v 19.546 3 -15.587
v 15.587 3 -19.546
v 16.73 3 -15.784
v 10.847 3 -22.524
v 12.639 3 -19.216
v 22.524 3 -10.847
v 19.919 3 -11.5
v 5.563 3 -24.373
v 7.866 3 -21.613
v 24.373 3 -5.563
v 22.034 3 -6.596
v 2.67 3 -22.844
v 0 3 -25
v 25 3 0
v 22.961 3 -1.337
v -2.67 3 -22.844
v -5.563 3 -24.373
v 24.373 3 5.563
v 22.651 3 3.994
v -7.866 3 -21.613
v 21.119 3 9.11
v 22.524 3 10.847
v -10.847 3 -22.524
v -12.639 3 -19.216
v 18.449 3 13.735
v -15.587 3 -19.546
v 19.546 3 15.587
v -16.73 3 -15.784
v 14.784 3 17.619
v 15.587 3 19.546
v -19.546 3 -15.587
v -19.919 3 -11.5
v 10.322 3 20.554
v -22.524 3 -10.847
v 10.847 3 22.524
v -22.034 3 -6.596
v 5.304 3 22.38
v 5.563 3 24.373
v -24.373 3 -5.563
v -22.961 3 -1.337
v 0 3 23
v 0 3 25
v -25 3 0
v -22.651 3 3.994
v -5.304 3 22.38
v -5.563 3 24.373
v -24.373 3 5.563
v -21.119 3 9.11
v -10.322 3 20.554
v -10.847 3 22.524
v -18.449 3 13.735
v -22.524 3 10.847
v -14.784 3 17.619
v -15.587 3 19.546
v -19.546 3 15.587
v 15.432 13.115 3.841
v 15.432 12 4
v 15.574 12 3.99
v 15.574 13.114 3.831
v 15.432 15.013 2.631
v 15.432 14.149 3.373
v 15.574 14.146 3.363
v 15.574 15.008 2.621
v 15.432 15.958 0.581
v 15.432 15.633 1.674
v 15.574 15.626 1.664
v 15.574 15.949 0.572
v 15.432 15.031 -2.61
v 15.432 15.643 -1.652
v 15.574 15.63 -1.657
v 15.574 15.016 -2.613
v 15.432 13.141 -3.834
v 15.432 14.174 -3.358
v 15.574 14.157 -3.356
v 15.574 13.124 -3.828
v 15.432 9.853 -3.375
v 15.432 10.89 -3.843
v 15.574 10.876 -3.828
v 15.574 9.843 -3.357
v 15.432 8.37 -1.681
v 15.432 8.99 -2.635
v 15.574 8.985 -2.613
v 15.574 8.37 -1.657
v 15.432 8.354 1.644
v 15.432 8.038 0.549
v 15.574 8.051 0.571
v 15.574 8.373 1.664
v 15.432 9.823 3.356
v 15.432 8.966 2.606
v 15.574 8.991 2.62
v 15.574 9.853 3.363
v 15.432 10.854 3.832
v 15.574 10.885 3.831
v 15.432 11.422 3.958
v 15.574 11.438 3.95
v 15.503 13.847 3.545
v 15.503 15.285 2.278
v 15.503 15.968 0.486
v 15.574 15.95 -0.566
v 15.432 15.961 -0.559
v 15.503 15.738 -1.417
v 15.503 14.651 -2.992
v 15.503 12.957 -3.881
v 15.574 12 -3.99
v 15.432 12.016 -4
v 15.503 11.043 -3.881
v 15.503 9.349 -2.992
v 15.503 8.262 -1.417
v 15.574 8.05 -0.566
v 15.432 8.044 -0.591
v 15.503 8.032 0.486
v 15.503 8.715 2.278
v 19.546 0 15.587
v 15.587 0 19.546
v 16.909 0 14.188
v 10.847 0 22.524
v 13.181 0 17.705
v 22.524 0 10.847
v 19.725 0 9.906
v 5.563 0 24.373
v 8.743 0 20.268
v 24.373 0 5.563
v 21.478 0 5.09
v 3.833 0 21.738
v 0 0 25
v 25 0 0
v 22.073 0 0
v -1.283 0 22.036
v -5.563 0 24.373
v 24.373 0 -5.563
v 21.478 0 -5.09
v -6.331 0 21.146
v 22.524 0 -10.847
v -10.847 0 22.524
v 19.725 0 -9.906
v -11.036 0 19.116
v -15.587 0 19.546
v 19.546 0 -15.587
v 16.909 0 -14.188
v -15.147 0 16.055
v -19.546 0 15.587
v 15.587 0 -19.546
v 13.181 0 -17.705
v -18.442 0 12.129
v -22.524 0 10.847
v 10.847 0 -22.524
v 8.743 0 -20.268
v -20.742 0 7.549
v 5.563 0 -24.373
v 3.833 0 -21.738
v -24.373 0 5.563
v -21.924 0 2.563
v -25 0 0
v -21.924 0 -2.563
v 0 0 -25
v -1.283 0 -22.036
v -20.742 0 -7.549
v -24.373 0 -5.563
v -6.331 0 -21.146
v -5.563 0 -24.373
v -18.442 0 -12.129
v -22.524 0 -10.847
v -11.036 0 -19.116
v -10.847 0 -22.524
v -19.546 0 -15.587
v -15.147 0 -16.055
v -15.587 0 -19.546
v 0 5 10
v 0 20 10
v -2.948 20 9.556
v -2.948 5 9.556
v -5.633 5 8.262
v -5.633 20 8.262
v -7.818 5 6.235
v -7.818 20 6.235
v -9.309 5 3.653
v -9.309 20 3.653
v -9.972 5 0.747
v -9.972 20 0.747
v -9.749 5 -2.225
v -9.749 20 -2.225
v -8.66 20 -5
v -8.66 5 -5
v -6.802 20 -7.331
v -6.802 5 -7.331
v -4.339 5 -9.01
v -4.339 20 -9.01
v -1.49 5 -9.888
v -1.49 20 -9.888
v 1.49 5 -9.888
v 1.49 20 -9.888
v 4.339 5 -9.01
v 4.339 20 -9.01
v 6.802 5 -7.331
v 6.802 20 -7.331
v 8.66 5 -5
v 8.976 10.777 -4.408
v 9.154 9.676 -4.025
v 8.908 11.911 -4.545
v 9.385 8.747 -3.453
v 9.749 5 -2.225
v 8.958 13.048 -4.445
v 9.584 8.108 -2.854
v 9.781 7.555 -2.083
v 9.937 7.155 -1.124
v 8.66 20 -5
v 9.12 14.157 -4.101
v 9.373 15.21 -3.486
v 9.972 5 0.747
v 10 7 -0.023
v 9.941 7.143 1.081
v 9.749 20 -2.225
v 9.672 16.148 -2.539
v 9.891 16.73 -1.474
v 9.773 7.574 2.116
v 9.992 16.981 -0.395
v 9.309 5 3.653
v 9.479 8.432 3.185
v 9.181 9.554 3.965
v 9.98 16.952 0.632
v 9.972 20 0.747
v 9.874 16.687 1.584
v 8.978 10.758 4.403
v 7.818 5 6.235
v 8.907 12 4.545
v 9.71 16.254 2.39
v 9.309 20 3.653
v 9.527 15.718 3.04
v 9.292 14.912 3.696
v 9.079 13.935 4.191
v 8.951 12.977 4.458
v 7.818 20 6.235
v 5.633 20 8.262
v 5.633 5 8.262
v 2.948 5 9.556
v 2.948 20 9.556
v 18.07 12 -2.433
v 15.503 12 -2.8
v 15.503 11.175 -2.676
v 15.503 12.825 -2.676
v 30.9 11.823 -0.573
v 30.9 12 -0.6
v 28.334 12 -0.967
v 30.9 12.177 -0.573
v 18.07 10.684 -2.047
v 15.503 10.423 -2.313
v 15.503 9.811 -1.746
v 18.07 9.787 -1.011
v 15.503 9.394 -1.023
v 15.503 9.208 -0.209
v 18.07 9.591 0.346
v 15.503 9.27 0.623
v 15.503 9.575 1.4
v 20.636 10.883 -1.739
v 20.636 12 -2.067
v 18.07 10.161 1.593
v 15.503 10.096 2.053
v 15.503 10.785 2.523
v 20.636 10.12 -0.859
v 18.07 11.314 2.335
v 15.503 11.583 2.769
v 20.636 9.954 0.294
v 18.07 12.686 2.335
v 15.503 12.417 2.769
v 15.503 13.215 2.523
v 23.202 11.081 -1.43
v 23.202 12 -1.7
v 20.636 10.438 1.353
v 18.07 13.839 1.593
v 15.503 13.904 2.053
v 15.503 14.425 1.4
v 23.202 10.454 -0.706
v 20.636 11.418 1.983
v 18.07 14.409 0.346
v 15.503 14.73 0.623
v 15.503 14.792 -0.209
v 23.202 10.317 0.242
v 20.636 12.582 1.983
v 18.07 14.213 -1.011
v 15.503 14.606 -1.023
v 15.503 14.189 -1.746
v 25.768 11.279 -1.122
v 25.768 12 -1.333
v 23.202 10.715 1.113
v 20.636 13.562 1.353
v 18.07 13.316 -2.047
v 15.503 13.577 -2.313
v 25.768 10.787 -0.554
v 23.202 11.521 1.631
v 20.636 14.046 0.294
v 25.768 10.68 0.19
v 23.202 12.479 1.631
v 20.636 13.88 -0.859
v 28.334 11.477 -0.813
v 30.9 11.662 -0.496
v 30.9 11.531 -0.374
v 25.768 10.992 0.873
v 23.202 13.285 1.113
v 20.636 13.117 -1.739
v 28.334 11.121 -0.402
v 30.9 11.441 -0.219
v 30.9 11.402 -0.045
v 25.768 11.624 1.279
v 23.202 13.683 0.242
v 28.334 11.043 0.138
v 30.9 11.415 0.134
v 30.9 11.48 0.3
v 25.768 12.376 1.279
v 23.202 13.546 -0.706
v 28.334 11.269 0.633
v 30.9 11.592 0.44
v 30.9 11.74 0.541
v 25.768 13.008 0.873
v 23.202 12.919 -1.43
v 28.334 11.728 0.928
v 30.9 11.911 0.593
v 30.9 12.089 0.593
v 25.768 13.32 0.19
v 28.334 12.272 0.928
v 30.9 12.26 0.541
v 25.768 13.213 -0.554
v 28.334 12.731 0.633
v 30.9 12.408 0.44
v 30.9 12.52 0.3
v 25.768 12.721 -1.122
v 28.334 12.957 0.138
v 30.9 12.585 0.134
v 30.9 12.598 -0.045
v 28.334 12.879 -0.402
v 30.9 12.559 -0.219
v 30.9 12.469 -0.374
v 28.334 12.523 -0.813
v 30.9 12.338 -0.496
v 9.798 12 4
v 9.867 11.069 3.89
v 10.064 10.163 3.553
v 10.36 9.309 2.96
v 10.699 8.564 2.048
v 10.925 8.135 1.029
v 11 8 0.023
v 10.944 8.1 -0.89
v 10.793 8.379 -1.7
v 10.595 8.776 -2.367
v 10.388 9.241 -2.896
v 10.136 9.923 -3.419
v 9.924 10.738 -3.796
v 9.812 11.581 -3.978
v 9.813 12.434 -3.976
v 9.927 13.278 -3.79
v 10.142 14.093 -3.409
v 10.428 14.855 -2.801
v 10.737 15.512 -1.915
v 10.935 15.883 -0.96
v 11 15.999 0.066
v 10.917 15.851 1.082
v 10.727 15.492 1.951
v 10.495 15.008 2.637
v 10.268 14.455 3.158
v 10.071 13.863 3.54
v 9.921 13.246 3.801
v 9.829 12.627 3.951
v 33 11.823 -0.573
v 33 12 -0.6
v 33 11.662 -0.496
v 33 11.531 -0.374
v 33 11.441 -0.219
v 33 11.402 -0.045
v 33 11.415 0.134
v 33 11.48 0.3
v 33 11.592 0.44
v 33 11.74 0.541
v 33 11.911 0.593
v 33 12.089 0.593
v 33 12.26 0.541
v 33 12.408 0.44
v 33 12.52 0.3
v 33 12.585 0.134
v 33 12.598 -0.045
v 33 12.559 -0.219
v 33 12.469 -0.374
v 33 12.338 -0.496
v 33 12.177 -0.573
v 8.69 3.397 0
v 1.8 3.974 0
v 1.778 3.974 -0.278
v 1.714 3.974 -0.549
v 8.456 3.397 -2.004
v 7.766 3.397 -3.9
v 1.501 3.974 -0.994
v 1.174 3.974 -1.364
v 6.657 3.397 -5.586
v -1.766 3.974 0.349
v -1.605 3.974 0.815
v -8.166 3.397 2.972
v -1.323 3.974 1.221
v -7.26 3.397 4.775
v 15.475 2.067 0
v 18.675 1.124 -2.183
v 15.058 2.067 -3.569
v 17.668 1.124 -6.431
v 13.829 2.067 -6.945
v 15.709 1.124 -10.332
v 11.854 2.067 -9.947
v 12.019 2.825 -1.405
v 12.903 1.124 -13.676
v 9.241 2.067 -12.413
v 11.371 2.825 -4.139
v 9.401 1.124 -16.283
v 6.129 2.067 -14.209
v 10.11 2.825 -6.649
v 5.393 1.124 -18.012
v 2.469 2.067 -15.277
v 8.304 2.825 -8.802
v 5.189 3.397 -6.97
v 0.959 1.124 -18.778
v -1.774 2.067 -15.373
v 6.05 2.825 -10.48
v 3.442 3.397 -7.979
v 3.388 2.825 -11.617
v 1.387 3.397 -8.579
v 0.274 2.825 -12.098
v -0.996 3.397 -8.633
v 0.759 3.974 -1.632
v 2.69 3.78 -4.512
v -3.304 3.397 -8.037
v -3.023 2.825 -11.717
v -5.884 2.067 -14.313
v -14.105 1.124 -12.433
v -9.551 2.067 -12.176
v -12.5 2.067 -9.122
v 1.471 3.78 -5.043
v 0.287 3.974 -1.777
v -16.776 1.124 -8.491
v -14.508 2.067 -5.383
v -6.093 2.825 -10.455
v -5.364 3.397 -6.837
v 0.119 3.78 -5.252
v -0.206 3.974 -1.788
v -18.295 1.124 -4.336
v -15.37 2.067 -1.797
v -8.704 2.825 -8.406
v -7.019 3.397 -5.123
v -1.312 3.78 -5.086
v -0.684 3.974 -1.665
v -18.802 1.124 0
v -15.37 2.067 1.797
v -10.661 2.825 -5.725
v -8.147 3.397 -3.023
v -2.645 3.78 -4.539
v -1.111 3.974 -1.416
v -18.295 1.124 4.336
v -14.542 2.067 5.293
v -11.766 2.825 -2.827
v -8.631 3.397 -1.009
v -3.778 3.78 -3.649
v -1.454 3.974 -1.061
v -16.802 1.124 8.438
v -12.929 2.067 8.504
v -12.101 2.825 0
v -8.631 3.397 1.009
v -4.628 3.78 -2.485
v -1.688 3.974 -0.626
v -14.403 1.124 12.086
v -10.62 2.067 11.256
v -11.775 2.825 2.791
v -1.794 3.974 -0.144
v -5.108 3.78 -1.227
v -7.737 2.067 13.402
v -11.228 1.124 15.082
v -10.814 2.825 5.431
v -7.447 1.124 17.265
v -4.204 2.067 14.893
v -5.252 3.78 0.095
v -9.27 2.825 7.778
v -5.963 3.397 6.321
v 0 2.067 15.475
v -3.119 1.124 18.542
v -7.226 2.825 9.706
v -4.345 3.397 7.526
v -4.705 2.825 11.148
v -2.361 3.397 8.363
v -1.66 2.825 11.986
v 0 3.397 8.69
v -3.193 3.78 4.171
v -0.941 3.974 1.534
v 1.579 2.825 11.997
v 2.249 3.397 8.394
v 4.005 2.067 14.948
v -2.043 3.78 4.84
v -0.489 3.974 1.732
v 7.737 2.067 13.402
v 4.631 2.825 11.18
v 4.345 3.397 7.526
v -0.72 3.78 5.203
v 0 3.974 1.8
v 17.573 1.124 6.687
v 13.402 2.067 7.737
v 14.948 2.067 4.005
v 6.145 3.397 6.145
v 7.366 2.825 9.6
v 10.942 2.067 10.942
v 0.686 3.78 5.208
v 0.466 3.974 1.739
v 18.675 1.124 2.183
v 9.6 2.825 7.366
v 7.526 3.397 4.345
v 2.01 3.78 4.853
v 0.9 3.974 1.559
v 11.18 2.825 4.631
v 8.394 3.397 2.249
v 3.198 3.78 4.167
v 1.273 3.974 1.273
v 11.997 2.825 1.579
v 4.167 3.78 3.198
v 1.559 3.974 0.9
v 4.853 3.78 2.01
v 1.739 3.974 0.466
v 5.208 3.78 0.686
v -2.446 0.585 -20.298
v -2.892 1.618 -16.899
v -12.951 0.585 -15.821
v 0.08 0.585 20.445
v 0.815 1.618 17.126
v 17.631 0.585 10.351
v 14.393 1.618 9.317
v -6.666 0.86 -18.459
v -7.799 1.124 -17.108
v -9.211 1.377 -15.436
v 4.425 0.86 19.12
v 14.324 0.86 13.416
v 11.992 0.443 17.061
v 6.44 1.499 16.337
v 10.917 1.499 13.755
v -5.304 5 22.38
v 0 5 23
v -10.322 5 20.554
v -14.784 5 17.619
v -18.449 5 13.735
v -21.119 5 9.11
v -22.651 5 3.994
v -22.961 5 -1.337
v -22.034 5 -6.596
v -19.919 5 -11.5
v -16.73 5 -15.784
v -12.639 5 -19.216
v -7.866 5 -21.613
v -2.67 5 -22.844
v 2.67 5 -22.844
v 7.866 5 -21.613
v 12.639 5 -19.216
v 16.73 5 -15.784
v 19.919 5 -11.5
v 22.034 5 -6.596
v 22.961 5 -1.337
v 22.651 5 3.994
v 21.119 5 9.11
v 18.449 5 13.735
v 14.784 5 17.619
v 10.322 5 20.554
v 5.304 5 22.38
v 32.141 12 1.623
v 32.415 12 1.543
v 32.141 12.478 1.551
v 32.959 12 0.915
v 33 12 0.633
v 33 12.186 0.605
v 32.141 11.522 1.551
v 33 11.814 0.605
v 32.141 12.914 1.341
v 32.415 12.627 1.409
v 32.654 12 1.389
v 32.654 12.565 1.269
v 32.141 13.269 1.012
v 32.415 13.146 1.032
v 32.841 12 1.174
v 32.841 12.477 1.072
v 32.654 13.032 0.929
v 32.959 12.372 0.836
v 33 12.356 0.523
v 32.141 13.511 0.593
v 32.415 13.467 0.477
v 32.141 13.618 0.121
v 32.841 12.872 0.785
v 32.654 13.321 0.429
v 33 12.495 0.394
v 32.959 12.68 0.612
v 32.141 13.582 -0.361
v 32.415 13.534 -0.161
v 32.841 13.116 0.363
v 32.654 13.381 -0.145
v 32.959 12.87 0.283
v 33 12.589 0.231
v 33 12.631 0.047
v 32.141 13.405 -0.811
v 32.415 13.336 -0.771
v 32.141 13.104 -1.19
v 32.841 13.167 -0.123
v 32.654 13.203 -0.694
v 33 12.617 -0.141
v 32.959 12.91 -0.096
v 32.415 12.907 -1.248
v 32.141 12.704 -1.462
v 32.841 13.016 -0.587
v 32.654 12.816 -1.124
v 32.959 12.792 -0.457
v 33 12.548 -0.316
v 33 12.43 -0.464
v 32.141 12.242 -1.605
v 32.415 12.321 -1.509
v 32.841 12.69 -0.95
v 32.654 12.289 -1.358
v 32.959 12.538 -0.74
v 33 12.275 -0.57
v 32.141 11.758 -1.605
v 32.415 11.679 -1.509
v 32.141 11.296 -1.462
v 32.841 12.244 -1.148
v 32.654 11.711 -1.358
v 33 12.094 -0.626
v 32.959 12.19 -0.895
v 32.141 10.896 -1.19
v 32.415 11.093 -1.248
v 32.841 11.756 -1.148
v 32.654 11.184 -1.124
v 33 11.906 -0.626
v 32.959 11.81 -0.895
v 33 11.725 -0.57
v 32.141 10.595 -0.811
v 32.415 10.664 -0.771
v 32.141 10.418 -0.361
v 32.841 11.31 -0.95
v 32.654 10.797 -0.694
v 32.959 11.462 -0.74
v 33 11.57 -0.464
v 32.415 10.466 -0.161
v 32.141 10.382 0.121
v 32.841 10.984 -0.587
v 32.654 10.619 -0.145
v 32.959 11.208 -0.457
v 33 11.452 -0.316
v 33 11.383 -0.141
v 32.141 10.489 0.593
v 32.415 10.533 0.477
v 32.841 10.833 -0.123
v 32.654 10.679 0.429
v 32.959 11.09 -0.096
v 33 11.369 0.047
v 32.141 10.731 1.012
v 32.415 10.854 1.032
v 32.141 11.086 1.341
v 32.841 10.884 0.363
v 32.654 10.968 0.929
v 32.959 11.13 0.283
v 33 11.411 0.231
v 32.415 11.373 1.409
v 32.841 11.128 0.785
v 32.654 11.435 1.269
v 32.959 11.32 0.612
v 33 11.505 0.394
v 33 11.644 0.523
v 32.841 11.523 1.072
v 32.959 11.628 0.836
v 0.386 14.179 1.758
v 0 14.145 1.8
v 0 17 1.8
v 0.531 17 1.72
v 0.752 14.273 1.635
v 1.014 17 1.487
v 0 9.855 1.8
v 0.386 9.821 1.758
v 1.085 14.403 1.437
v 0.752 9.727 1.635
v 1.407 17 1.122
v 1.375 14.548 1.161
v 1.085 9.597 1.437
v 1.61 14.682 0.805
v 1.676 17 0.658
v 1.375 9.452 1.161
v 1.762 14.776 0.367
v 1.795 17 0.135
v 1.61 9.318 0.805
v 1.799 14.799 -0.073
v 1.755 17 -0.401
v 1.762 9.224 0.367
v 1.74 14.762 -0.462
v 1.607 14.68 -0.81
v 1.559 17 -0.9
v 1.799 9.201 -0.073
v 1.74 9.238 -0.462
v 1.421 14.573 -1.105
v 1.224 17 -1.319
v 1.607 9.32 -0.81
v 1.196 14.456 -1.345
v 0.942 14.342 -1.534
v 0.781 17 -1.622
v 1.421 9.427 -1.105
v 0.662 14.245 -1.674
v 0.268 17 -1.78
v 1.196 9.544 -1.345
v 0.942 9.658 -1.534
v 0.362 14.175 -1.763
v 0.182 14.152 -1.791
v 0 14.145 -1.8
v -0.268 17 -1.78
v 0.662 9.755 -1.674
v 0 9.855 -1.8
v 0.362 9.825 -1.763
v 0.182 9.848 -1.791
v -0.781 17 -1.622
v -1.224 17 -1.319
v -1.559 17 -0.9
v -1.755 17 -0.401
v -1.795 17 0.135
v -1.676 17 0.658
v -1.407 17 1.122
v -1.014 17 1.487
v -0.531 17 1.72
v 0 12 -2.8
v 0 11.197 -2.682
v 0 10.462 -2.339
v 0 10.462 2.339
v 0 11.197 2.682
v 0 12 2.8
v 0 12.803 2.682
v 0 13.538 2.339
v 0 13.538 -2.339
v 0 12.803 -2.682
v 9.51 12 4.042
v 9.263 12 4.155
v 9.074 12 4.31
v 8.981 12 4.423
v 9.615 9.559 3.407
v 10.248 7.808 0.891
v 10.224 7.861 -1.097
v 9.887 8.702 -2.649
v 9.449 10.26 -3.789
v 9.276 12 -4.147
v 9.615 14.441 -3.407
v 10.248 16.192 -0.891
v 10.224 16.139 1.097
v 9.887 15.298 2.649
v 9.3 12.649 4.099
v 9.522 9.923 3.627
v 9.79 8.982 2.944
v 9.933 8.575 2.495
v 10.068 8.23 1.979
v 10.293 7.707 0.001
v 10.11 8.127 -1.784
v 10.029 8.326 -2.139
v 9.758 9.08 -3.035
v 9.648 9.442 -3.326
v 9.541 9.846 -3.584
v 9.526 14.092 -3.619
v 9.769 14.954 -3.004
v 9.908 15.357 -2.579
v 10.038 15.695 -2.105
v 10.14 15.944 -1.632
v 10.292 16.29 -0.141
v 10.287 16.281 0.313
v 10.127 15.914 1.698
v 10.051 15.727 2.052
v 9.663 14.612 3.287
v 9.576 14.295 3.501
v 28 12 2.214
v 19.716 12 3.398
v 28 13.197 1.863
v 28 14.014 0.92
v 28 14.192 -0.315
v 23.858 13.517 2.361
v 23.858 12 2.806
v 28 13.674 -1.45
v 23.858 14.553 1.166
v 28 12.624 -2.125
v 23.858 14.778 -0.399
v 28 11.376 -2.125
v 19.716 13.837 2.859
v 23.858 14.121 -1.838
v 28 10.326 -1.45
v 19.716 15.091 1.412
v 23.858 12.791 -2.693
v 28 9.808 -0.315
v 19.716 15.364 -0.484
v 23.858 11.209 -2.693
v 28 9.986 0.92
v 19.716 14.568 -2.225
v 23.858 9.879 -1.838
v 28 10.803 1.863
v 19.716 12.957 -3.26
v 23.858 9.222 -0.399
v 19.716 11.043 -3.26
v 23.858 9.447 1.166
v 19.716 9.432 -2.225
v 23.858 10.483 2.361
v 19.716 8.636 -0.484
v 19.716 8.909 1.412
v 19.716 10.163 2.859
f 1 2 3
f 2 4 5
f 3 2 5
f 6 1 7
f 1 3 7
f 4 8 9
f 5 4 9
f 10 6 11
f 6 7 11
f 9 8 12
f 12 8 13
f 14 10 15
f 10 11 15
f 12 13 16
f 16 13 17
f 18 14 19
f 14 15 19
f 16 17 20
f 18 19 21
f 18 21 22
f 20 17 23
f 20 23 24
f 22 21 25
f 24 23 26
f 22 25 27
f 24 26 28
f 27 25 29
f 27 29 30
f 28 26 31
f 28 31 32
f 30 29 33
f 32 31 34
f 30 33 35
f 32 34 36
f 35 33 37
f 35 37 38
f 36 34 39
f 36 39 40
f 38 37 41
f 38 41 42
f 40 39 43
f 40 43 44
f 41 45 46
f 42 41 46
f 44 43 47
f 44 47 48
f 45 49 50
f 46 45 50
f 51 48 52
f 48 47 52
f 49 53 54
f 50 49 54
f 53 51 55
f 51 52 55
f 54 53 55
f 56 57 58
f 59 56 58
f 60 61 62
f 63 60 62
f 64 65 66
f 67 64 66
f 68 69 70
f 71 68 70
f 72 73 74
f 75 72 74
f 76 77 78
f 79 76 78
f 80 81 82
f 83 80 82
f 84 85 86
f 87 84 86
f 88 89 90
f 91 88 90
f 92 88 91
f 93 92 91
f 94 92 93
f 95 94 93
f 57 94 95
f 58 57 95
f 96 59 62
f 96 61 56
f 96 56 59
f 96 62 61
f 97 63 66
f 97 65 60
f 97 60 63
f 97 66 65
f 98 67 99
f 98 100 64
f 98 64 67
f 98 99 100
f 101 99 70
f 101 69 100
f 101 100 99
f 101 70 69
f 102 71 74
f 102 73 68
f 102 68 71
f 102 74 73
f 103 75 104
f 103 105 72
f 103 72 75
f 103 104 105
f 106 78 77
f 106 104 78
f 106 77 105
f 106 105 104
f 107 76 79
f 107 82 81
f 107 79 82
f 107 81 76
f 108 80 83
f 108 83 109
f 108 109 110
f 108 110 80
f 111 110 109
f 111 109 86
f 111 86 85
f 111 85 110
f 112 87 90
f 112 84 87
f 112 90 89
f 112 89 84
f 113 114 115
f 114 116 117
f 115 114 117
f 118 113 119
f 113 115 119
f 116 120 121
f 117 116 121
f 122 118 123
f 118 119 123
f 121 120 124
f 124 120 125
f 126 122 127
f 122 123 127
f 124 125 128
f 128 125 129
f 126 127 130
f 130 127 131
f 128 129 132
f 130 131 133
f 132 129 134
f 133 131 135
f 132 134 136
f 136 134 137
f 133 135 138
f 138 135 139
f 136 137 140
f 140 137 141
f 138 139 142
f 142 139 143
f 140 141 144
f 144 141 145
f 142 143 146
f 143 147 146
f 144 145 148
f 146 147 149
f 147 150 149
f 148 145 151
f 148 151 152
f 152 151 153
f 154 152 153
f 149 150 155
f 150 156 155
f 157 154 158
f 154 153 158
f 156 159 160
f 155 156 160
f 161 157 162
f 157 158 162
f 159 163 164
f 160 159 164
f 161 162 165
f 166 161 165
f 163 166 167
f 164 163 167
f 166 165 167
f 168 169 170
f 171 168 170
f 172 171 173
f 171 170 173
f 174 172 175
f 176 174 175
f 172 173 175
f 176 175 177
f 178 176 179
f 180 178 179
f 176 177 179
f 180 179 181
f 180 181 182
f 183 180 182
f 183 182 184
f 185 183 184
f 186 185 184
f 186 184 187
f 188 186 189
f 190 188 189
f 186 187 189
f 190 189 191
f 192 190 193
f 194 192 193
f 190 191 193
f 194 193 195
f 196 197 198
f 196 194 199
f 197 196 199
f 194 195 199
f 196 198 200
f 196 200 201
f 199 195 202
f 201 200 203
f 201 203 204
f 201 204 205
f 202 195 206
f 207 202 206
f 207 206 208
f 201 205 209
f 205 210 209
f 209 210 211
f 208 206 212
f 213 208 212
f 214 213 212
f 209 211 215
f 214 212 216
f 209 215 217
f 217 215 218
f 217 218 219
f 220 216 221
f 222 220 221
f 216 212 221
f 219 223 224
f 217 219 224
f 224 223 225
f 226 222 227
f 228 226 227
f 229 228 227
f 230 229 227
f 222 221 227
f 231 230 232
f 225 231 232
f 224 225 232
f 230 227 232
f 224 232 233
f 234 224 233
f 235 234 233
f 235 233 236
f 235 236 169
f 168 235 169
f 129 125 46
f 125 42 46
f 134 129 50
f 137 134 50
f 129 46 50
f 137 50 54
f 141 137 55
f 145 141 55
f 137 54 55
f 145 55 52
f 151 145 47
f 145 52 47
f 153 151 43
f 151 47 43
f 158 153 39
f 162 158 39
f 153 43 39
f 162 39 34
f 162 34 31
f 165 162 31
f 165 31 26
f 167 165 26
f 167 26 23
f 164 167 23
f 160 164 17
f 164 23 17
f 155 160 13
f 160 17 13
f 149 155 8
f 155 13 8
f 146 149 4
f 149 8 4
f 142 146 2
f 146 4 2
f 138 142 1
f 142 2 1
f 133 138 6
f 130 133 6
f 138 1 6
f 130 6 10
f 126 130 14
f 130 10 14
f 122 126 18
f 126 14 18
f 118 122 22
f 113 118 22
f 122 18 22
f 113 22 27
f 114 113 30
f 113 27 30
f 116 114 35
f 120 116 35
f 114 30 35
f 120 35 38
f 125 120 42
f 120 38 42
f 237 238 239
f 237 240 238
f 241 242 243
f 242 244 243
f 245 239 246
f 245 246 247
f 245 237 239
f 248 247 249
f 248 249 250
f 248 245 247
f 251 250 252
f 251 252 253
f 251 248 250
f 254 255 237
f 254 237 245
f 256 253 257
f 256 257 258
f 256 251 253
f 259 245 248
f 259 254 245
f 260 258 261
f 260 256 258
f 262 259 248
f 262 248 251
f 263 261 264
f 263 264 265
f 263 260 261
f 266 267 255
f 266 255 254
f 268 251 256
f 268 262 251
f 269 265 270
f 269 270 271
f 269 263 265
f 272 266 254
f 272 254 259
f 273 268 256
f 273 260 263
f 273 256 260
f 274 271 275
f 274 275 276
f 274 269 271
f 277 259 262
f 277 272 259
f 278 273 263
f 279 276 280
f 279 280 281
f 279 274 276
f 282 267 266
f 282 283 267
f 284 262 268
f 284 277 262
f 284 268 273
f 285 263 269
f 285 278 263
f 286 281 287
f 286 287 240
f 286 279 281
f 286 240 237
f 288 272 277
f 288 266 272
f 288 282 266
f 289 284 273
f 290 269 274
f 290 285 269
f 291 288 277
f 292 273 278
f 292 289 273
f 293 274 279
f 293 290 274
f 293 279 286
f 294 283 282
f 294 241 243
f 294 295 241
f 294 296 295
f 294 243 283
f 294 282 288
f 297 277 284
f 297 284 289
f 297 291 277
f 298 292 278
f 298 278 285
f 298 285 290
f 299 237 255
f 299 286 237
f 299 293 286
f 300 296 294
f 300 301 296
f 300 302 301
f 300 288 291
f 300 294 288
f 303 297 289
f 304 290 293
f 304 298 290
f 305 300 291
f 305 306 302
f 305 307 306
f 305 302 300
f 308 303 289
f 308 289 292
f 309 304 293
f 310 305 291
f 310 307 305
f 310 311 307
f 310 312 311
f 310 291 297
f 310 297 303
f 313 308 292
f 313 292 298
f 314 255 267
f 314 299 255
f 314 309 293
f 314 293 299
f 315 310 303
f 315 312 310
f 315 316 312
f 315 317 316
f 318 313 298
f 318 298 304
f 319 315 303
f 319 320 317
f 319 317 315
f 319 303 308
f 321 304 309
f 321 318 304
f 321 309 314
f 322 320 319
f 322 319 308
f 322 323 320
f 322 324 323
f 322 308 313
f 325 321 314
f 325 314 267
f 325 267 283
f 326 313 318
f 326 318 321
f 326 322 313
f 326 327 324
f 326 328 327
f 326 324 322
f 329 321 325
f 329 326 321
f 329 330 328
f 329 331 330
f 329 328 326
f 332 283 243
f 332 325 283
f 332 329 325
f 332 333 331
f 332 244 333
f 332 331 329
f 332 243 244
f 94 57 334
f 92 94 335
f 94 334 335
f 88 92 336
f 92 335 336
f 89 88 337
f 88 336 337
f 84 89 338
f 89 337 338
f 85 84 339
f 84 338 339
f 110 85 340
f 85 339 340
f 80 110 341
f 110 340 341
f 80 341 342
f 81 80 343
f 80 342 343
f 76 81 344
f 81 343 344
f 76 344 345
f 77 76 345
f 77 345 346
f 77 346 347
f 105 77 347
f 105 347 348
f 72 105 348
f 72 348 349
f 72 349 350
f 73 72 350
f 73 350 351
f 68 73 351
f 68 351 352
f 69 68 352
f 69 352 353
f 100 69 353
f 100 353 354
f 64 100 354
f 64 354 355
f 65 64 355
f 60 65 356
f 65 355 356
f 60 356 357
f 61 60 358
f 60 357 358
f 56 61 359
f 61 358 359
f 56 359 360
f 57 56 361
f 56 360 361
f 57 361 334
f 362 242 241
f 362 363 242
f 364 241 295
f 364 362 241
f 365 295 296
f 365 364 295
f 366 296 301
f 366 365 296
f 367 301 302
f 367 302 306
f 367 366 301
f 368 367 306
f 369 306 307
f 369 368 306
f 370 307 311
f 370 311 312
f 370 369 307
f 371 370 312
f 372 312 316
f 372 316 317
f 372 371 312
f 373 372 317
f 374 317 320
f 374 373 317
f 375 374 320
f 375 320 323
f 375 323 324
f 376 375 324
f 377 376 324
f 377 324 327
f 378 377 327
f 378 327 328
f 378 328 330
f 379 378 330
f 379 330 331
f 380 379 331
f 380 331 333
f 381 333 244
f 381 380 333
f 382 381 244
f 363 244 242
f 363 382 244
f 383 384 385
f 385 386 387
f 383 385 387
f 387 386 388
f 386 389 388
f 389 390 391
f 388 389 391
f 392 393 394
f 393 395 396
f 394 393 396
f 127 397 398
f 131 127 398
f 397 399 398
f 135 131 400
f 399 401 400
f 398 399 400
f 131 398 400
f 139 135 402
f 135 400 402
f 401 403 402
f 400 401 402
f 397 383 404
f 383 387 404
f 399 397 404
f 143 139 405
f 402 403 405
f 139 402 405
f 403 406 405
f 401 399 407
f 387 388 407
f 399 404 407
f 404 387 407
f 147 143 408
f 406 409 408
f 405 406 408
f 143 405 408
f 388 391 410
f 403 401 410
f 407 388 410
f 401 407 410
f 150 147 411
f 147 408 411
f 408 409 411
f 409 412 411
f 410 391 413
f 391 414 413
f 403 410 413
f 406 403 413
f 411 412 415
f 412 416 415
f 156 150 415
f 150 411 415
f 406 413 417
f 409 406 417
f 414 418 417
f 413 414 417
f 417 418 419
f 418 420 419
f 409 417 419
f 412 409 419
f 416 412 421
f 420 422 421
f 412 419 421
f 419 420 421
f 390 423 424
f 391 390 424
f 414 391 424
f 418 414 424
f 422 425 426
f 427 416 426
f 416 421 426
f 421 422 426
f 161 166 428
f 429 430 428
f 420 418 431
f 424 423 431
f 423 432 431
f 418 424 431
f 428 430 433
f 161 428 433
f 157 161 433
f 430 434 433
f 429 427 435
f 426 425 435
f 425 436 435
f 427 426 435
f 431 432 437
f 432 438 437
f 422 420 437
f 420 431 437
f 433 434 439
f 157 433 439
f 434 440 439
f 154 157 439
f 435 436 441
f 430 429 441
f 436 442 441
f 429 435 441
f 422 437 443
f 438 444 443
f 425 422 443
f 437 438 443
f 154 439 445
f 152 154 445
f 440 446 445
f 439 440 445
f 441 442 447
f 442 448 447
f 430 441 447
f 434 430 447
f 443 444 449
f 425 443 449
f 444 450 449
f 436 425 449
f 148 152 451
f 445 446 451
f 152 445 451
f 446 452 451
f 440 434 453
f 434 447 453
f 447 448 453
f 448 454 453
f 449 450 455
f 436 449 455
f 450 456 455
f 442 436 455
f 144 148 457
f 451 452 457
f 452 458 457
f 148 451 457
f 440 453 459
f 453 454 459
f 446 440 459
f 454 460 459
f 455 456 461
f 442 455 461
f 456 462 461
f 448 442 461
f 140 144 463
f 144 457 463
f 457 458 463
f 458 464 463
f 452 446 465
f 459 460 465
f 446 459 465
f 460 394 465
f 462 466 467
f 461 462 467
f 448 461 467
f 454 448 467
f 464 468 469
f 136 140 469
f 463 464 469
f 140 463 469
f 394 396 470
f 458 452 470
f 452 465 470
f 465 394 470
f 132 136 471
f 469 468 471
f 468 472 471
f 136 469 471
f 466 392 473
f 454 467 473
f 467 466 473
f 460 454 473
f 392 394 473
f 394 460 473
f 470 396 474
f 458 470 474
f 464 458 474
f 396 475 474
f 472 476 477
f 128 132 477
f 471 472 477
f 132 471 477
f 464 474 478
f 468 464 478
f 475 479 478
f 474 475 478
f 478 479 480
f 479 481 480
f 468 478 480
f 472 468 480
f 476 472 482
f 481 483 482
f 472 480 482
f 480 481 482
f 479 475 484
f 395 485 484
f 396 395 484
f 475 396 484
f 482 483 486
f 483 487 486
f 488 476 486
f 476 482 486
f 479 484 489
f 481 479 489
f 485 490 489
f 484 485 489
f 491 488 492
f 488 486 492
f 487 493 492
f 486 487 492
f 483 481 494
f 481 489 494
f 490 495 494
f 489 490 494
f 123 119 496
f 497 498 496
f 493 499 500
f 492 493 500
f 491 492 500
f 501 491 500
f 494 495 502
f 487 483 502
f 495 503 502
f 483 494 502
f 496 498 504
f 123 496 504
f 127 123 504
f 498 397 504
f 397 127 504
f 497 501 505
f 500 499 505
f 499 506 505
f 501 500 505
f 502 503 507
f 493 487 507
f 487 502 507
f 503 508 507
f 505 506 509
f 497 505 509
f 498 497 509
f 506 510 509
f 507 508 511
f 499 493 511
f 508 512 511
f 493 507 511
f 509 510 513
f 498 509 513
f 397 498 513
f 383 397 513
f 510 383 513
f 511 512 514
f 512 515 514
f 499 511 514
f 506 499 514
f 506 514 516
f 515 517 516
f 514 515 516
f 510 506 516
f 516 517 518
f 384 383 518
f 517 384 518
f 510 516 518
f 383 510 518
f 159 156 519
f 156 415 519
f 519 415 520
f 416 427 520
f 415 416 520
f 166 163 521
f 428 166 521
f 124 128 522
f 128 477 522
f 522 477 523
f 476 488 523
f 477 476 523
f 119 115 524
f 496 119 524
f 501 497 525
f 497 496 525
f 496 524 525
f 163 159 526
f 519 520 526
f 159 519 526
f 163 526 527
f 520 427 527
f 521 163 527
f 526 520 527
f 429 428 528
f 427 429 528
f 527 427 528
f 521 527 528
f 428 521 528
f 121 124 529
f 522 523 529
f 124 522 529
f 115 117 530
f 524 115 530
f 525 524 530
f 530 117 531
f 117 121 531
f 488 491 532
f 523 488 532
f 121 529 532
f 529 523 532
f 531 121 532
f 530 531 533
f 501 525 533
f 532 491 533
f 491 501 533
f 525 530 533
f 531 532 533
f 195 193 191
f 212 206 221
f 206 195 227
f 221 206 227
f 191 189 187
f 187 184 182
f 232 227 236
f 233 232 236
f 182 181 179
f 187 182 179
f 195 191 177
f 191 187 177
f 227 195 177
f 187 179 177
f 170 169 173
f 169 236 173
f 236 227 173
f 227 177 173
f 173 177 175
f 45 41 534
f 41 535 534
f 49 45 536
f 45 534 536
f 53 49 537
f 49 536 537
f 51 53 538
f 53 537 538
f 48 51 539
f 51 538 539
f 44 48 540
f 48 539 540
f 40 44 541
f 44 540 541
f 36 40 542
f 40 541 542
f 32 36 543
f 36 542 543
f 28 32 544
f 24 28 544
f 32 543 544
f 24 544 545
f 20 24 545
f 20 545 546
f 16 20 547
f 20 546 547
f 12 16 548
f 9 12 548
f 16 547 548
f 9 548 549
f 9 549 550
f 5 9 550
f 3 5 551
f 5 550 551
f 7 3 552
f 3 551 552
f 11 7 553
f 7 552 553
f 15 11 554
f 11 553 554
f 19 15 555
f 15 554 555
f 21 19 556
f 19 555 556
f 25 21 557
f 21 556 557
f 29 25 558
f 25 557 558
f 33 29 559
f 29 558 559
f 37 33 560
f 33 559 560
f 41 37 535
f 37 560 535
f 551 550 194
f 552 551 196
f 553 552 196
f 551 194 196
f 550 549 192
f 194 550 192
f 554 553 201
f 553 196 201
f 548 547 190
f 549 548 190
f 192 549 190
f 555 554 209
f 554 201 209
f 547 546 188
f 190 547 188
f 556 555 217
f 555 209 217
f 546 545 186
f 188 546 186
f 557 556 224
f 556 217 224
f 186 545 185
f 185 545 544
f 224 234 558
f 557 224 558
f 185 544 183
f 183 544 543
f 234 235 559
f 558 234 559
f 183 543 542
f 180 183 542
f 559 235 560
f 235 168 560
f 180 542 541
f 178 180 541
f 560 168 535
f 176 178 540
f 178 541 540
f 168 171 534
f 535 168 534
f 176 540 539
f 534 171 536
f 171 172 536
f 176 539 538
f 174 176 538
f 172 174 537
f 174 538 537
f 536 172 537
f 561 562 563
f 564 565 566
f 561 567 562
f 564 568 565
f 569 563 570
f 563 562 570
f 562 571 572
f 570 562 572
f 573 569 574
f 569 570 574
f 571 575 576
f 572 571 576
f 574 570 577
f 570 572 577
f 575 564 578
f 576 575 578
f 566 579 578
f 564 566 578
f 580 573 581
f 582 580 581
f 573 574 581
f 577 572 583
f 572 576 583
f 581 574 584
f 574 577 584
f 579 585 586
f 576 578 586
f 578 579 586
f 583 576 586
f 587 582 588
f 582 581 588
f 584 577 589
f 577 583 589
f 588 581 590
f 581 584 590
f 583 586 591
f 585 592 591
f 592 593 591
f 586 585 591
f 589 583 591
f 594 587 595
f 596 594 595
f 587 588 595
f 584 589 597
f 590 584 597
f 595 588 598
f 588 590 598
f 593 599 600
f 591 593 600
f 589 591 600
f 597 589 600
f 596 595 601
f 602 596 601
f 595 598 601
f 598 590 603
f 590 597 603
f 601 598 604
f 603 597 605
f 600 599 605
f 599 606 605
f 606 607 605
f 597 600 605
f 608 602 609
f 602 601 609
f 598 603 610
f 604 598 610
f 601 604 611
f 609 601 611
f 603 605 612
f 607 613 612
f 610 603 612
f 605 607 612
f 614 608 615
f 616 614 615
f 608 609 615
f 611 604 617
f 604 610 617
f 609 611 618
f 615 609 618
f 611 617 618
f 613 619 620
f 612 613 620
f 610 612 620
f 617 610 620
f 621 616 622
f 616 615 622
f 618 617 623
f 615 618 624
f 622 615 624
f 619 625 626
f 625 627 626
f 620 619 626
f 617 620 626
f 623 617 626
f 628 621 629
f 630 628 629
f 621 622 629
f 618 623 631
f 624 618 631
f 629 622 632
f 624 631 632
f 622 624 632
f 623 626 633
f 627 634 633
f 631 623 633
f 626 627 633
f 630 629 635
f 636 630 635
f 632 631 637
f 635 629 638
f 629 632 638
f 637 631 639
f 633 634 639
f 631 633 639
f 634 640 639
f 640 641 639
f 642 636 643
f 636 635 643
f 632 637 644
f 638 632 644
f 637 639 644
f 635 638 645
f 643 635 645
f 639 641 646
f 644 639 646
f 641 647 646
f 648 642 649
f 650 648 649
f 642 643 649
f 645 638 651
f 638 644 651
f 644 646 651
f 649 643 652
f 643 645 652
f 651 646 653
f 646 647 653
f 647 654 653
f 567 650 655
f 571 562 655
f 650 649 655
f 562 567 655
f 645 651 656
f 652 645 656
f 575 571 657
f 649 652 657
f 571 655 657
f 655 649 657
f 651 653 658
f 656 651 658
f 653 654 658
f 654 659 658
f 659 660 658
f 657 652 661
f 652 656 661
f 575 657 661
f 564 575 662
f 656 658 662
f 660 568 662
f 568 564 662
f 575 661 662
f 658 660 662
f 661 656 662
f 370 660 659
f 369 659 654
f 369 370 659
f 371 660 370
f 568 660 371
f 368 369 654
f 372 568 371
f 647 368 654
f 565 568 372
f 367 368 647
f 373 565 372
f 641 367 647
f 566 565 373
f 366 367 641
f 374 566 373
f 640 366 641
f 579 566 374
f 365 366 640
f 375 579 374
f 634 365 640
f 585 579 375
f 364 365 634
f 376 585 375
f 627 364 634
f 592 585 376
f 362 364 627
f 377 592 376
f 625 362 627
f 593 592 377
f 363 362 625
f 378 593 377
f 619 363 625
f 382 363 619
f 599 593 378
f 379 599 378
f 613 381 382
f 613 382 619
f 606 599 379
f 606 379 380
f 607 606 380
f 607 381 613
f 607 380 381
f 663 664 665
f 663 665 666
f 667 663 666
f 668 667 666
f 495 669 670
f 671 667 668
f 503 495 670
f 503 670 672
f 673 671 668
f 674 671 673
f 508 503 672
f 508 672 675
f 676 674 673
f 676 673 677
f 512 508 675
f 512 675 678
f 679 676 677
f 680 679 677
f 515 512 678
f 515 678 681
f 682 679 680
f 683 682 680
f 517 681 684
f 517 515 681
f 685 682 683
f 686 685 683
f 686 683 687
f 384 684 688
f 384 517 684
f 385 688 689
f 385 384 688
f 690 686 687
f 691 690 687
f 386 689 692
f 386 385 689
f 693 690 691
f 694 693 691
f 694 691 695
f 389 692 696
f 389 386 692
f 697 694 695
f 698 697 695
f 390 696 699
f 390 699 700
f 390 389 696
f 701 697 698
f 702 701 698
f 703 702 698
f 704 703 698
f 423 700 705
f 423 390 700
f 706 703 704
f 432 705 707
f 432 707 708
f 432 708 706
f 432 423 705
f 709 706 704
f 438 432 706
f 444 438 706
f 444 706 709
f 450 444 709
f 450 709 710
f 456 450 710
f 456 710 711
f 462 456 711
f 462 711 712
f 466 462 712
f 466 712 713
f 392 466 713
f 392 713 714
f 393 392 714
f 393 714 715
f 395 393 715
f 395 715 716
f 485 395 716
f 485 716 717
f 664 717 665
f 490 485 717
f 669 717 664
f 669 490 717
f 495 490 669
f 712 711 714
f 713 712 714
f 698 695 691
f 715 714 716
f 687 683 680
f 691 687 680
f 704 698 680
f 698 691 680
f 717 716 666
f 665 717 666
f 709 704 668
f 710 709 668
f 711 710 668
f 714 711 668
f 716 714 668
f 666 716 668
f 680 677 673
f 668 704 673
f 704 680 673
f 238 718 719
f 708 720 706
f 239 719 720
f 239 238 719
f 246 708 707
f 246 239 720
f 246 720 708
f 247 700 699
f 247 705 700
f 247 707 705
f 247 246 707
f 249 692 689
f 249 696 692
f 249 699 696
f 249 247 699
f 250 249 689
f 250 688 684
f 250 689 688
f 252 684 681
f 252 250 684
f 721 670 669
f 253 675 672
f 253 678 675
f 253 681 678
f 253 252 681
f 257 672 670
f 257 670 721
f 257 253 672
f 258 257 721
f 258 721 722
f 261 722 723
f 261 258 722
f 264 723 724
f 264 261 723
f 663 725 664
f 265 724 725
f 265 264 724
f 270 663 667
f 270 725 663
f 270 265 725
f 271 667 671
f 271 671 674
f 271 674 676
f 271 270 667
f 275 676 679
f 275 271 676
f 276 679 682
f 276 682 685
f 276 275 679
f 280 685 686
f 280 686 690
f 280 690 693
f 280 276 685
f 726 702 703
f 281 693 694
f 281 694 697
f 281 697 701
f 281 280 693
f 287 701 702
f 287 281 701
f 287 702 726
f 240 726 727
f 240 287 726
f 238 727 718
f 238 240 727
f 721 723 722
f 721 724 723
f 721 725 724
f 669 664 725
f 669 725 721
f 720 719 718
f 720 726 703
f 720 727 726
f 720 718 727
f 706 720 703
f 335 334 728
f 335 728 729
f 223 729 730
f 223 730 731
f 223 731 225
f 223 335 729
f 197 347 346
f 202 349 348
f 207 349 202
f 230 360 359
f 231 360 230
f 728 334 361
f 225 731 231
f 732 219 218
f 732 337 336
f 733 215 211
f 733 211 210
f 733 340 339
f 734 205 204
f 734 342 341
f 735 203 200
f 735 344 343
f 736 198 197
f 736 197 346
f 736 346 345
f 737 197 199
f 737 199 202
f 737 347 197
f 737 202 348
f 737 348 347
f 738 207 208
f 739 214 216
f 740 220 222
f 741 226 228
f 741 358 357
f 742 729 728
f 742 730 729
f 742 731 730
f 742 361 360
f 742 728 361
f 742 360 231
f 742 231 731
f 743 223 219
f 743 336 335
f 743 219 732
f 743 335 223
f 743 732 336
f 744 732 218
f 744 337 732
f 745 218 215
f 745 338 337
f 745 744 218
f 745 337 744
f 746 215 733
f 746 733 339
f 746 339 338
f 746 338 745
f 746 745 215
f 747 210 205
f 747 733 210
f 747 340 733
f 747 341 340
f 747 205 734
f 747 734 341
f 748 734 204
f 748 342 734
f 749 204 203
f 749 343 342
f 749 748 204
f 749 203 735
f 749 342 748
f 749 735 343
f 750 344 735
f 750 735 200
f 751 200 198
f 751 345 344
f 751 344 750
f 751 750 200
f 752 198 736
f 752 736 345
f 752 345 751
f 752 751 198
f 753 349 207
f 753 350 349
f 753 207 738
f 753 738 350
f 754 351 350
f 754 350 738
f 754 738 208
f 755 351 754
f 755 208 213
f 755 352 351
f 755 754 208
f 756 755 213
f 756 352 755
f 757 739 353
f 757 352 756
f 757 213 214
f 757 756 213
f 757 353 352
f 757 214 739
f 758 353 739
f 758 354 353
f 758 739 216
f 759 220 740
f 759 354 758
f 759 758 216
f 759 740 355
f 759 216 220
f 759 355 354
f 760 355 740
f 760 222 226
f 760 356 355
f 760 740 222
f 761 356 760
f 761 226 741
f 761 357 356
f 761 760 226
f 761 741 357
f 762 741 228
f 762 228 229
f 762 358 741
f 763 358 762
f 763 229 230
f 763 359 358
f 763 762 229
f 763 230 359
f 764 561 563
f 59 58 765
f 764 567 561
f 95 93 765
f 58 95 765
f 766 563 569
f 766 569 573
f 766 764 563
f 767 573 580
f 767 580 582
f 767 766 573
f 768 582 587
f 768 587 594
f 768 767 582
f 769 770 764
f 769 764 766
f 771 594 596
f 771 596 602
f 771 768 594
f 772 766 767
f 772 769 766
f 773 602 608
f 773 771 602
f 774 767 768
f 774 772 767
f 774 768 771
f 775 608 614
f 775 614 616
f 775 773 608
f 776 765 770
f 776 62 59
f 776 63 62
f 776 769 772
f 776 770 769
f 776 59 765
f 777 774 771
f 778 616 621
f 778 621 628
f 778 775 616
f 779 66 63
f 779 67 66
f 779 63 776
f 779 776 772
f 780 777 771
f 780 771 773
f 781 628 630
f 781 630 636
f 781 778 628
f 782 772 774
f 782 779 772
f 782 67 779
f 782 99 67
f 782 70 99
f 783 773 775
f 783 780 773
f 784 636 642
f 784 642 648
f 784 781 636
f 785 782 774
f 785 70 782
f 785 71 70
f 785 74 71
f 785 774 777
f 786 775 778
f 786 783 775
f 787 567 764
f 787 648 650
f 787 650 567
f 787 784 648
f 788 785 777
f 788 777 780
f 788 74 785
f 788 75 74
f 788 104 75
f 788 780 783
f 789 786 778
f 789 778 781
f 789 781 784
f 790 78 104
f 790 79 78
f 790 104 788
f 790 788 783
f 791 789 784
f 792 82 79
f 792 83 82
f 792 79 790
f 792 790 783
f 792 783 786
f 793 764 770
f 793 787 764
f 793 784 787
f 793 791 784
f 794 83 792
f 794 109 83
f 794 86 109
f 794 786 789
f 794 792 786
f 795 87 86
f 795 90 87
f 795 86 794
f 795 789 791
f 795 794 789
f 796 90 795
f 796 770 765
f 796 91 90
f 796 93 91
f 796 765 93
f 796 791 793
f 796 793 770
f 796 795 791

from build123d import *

# Parameters (mm, degrees)
SKETCH3_R               = 4
BOSS_EXTRUDE1_DEPTH     = 25
BOSS_EXTRUDE2_START     = 25
SKETCH3_5_R             = 3
BOSS_EXTRUDE2_DEPTH     = 8
CUT_EXTRUDE1_DEPTH      = 17
CUT_EXTRUDE1_DEPTH_BACK = 46.978255774
SKETCH15_R              = 1.8
FILLET3_R               = 1


with BuildPart() as part:
    # Sketch1 → Revolve1 (revolve)
    with BuildSketch(Plane.XY, mode=Mode.PRIVATE) as revolve1_sk:
        Polygon((0, 20), (0, 0), (25, 0), (25, 3), (23, 3), (23, 5), (10, 5), (10, 20), align=None)
    revolve(revolve1_sk.sketch.rotate(Axis((0, 20, 0), (0, -1, 0)), 90), axis=Axis((0, 20, 0), (0, -1, 0)))

    # Sketch3 → Boss-Extrude1 (add)
    with BuildSketch(Plane(origin=(0, 0, 0), x_dir=(0, 0, -1), z_dir=(1, 0, 0))):
        with Locations(Location((0, 12, 0), (0, 0, 180))):
            Circle(SKETCH3_R)
    extrude(amount=BOSS_EXTRUDE1_DEPTH)

    # Sketch3<5> → Boss-Extrude2 (add)
    with BuildSketch(Plane(origin=(0, 0, 0), x_dir=(0, 0, -1), z_dir=(1, 0, 0)).offset(BOSS_EXTRUDE2_START)):
        with Locations((0, 12)):
            Circle(SKETCH3_5_R)
    extrude(amount=BOSS_EXTRUDE2_DEPTH)

    # Sketch11 → Cut-Revolve10 (revolve, cut)
    with BuildSketch(Plane.XY):
        with BuildLine():
            Line((0, 4), (0, 0))
            Line((0, 0), (22.072872435, 0))
            ThreePointArc((22.072872435, 0), (11.216213299, 2.992049146), (0, 4))
        make_face()
    revolve(axis=Axis((0, 0, 0), (0, 1, 0)), mode=Mode.SUBTRACT)

    # Sketch15 → Cut-Extrude1 (cut, two sides: drawn at the far end of the back side and taken through both)
    with BuildSketch(Plane(origin=(0, 0, 0), x_dir=(1, 0, 0), z_dir=(0, 1, 0)).offset(-CUT_EXTRUDE1_DEPTH_BACK)):
        with Locations(Location((0, 0, 0), (0, 0, 270))):
            Circle(SKETCH15_R)
    extrude(amount=CUT_EXTRUDE1_DEPTH + CUT_EXTRUDE1_DEPTH_BACK, mode=Mode.SUBTRACT)

    # Sketch16 → Cut-Revolve12 (revolve, cut)
    with BuildSketch(Plane.XY, mode=Mode.PRIVATE) as cut_revolve12_sk:
        Polygon((33, 15), (33, 13.5), (15.503373698, 16), (33, 16), align=None)
    revolve(cut_revolve12_sk.sketch.rotate(Axis((33, 12, 0), (-1, 0, 0)), 270), axis=Axis((33, 12, 0), (-1, 0, 0)), mode=Mode.SUBTRACT)

    # Sketch17 → Cut-Revolve13 (revolve, cut)
    with BuildSketch(Plane.XY, mode=Mode.PRIVATE) as cut_revolve13_sk:
        Polygon((33, 12.6), (33, 12), (0, 12), (0, 14.8), (15.503373698, 14.8), (30.900404844, 12.6), align=None)
    revolve(cut_revolve13_sk.sketch.rotate(Axis((33, 12, 0), (-1, 0, 0)), 90), axis=Axis((33, 12, 0), (-1, 0, 0)), mode=Mode.SUBTRACT)

    # Fillet3
    fillet3_edges = [part.edges().sort_by_distance(p)[0] for p in [
        (9.16515139, 12, -4),
        (15.503373698, 12, -4),
        (33, 12, -1.5),
    ]]
    fillet(fillet3_edges, radius=FILLET3_R)


solid = part.part
